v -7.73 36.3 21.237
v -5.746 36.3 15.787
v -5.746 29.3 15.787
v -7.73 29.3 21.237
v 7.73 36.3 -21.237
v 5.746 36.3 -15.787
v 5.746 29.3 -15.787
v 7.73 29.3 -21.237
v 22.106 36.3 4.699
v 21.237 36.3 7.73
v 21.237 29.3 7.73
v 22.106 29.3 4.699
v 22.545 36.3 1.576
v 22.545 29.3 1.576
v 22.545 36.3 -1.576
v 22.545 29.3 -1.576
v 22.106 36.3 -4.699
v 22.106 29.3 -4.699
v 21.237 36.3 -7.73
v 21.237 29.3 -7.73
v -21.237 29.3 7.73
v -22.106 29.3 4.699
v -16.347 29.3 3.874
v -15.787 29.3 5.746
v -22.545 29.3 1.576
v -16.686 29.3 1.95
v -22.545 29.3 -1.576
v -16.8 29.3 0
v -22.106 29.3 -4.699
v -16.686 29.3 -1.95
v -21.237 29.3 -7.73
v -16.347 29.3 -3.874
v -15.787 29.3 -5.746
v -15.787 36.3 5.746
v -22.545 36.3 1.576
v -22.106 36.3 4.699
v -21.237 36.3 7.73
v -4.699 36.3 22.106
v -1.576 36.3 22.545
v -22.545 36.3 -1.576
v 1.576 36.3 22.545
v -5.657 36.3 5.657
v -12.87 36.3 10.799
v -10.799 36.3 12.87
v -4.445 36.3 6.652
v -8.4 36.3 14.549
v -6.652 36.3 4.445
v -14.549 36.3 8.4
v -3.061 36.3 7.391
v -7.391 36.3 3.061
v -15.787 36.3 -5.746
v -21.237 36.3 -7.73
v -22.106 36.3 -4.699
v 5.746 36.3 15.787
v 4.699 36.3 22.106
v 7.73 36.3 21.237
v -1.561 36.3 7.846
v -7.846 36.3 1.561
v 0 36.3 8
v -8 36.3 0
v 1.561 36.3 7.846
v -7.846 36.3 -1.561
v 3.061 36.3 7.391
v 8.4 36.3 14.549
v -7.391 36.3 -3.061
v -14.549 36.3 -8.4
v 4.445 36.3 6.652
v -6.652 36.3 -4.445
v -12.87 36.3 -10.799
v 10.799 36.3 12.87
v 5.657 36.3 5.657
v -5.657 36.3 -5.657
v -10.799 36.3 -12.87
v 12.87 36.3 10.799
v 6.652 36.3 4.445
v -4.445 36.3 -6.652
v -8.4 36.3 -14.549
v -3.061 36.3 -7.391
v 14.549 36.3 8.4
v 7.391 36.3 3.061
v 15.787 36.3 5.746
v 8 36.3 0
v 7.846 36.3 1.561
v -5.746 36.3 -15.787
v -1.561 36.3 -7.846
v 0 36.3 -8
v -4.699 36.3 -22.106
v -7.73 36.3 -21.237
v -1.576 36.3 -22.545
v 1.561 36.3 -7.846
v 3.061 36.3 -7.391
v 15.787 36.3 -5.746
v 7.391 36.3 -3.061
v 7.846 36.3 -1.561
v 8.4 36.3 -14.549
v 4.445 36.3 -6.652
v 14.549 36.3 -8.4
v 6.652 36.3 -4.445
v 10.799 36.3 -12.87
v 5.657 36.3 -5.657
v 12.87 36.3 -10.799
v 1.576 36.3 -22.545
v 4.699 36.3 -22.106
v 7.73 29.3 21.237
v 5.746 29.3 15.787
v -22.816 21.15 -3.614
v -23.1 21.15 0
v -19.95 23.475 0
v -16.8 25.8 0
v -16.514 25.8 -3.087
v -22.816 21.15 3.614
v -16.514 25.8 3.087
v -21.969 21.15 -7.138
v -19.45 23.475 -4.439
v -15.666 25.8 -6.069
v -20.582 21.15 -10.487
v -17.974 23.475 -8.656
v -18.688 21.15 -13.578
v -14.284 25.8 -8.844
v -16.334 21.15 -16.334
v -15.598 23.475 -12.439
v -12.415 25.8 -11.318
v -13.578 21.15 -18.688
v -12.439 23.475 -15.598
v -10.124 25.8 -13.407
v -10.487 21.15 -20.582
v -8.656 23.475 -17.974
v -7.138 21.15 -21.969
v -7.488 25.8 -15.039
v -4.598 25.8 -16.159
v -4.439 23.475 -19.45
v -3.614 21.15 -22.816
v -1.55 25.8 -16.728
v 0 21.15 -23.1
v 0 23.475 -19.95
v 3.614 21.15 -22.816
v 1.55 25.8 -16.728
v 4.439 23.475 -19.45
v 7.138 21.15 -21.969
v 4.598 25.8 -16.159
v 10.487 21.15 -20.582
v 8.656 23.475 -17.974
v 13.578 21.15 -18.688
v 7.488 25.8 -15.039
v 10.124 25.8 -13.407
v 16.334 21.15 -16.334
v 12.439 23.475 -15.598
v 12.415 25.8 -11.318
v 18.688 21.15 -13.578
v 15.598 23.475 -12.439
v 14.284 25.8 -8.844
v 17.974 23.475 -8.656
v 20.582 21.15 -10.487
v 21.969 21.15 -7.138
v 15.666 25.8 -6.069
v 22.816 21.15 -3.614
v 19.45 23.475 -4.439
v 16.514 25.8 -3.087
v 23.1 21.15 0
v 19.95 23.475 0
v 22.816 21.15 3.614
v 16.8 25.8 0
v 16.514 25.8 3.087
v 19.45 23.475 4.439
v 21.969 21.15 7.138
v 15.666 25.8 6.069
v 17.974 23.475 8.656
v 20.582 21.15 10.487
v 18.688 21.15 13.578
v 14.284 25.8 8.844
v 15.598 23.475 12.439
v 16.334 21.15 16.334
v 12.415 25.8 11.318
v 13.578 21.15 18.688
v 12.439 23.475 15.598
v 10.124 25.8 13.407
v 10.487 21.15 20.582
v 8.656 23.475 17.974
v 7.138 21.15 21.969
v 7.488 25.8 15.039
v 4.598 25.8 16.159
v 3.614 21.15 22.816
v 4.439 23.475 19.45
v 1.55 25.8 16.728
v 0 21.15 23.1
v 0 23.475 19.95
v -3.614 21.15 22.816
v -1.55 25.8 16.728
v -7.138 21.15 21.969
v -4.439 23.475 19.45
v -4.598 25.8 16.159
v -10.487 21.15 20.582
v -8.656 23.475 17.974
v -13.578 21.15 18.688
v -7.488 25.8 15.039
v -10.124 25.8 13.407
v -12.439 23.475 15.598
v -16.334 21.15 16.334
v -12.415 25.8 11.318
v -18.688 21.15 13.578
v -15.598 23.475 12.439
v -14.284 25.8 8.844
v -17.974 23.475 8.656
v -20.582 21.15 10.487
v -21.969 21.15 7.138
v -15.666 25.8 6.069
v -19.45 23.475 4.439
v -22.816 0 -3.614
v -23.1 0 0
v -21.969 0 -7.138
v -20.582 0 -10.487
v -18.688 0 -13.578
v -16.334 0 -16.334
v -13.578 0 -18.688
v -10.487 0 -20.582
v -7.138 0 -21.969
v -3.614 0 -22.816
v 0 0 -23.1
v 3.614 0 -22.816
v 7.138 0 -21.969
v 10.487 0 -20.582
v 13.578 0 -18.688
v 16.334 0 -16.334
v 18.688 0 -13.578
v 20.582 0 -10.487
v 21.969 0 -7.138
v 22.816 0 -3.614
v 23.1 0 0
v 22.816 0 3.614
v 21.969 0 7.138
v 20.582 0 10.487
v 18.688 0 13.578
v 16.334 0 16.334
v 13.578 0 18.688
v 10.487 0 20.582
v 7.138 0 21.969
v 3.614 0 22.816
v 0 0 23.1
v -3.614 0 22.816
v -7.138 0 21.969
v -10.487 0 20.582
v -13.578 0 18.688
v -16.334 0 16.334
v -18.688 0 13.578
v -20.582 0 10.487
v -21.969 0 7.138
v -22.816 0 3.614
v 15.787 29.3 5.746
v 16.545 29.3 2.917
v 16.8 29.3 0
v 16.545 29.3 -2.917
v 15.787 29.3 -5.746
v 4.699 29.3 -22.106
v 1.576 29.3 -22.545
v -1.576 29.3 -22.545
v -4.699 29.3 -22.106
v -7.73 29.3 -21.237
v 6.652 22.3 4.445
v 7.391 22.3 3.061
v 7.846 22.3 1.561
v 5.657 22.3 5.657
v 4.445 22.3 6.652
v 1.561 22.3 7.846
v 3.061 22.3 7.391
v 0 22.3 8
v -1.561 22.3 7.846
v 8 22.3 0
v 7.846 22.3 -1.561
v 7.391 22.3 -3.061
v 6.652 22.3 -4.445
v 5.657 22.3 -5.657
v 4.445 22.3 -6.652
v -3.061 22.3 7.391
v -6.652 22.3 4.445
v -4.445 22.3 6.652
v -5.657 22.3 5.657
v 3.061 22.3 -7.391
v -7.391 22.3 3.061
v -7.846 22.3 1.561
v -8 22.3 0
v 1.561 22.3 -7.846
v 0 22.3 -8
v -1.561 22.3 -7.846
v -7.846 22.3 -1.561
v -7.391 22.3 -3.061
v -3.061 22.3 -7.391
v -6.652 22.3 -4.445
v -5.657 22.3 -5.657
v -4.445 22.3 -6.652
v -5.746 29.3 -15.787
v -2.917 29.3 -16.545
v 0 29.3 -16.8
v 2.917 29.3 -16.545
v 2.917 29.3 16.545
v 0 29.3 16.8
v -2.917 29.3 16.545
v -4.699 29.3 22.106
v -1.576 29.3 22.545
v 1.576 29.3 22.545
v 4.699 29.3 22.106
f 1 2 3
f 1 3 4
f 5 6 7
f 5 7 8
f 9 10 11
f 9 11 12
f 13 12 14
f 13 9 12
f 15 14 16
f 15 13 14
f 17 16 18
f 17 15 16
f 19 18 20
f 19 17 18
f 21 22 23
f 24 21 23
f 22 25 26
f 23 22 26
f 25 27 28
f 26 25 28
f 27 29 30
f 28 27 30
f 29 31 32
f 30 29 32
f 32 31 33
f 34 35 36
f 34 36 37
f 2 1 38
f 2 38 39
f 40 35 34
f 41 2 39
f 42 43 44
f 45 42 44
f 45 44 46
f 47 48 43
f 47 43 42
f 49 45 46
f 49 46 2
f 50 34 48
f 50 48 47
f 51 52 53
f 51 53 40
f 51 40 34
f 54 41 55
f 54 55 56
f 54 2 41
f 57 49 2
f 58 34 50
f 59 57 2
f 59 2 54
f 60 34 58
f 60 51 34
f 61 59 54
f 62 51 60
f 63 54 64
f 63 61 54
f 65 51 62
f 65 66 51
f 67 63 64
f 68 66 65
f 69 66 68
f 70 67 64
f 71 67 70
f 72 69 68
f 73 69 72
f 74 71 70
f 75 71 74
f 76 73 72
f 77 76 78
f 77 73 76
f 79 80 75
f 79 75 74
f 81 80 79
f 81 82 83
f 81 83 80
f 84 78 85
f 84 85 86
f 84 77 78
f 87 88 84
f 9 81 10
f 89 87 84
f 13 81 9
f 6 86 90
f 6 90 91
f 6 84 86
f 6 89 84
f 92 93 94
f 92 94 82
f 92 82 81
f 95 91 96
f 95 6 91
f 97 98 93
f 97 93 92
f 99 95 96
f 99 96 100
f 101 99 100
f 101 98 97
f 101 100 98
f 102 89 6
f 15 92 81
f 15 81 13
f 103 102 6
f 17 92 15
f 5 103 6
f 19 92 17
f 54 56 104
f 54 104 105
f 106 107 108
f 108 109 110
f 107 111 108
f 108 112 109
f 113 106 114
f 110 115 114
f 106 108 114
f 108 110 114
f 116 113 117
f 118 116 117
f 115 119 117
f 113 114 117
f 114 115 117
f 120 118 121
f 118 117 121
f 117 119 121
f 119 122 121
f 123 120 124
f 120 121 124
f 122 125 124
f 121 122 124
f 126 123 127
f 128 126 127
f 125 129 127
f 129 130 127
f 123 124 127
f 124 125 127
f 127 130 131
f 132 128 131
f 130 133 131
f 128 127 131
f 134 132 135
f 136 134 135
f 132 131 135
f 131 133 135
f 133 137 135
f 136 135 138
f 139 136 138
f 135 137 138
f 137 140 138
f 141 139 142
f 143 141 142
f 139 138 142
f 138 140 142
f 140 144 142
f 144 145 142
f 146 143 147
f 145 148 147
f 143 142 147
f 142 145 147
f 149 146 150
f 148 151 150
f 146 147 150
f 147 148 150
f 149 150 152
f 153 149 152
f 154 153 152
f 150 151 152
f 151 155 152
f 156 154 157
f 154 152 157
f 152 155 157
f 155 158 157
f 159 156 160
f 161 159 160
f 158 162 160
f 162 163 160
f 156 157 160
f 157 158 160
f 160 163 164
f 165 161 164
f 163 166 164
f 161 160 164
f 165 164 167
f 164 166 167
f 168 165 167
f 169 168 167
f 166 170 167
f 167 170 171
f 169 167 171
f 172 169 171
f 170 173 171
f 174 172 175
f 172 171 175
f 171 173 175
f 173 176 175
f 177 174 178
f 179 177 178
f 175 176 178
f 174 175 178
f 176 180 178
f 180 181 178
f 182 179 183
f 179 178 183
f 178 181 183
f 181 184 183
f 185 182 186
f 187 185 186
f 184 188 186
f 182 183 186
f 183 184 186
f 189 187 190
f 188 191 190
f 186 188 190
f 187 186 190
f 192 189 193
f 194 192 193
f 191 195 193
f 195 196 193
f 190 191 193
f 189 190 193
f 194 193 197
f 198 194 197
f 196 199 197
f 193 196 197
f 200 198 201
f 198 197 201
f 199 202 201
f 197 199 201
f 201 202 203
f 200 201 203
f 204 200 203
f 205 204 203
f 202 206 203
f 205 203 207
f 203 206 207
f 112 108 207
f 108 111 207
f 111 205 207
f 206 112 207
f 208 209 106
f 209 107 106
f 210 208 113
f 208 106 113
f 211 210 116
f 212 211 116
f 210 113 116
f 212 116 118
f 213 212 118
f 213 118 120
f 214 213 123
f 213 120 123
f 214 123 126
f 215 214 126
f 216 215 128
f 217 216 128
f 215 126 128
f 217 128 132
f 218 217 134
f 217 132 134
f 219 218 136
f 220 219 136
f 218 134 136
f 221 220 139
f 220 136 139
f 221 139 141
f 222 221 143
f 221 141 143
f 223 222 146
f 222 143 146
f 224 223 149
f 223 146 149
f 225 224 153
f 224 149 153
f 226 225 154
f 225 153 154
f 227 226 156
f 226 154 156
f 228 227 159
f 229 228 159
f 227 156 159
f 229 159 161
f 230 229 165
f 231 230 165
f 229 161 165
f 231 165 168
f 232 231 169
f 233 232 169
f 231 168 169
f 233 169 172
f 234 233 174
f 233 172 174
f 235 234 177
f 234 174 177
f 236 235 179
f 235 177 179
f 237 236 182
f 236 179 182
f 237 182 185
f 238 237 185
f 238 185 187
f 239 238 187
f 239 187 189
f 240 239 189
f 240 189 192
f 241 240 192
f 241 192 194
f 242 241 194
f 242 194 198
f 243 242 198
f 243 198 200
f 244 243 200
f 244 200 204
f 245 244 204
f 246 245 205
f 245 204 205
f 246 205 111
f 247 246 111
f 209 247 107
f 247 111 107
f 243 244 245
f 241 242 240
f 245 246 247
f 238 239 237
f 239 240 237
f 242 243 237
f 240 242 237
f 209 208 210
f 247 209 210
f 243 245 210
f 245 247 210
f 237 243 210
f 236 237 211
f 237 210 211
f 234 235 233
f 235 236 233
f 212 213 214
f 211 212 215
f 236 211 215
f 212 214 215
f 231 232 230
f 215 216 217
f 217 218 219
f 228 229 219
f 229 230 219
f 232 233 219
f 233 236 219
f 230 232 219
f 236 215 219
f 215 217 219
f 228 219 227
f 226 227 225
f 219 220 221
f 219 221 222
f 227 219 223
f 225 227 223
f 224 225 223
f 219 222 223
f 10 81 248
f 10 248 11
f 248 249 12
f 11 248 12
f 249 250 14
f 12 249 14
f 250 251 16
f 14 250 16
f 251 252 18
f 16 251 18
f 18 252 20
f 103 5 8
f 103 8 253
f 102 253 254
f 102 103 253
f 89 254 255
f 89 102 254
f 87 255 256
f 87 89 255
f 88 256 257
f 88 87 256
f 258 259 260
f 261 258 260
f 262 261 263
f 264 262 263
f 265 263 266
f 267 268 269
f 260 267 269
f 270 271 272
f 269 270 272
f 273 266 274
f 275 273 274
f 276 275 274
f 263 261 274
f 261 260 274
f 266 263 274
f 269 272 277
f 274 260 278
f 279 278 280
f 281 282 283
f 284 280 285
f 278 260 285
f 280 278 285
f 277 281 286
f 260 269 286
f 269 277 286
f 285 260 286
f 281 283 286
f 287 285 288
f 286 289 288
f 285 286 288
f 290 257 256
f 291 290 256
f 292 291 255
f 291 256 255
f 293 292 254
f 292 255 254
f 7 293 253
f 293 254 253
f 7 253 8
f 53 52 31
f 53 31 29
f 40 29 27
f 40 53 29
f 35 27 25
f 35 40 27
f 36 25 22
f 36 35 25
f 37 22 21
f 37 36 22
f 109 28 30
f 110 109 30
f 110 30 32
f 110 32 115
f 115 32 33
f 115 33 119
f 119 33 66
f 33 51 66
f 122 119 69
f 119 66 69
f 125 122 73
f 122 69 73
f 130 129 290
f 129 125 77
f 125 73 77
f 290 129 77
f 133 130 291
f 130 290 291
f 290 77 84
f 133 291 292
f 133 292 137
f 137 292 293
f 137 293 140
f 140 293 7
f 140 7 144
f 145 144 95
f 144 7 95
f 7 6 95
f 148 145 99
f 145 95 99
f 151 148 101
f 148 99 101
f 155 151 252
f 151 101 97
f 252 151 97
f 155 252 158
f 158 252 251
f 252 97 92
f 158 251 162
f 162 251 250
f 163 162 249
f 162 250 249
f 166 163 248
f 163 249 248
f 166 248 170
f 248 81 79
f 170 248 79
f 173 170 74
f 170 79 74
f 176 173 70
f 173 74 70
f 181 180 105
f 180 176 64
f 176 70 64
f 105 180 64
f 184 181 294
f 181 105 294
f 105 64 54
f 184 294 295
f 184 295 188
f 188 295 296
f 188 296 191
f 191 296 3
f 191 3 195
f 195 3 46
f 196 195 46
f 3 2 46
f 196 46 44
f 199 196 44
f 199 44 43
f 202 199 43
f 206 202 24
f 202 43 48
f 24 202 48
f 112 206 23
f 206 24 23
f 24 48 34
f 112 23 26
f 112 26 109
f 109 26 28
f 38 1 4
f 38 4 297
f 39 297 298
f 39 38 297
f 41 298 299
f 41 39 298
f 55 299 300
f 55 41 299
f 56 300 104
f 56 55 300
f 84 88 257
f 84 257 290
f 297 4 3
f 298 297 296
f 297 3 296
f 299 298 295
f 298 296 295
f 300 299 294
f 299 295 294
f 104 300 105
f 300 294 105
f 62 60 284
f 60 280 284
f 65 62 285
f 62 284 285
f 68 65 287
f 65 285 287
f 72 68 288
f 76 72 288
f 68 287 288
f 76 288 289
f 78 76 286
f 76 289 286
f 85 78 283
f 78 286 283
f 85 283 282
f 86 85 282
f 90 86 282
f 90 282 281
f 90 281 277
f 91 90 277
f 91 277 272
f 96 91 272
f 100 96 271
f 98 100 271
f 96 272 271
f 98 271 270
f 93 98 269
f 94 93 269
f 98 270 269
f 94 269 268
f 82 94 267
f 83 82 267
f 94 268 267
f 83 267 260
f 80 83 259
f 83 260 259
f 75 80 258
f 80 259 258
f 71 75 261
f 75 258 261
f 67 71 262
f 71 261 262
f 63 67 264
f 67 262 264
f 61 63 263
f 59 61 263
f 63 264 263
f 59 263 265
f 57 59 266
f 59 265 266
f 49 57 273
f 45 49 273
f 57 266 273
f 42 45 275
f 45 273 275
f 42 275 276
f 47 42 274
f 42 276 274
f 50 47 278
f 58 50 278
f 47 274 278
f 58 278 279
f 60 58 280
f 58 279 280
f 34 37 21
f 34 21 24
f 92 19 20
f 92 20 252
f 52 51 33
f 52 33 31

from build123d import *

# Parameters (mm, degrees)
DODANIE_WYCI_GNI_CIE1_DEPTH = 7


with BuildPart() as part:
    # Szkic1 → Obrót1 (revolve)
    with BuildSketch(Plane.XY):
        Polygon((0, 0), (-23.1, 0), (-23.1, 21.15), (-16.8, 25.8), (-16.8, 36.3), (-8, 36.3), (-8, 22.3), (0, 22.3), align=None)
    revolve(axis=Axis((0, 22.3, 0), (0, -1, 0)))

    # Szkic2 → Dodanie-wyciągnięcie1 (add)
    with BuildSketch(Plane(origin=(0, 36.3, 0), x_dir=(1, 0, 0), z_dir=(0, 1, 0))):
        with BuildLine():
            Line((-7.729655239, 21.23705323), (-5.745938408, 15.786836029))
            ThreePointArc((-5.745938408, 15.786836029), (0, 16.8), (5.745938408, 15.786836029))
            Line((5.745938408, 15.786836029), (7.729655239, 21.23705323))
            ThreePointArc((7.729655239, 21.23705323), (0, 22.6), (-7.729655239, 21.23705323))
        make_face()
        with BuildLine():
            ThreePointArc((15.786836029, 5.745938408), (16.8, 0), (15.786836029, -5.745938408))
            Line((15.786836029, -5.745938408), (21.23705323, -7.729655239))
            ThreePointArc((21.23705323, -7.729655239), (22.6, 0), (21.23705323, 7.729655239))
            Line((21.23705323, 7.729655239), (15.786836029, 5.745938408))
        make_face()
        with BuildLine():
            ThreePointArc((5.745938408, -15.786836029), (0, -16.8), (-5.745938408, -15.786836029))
            Line((-5.745938408, -15.786836029), (-7.729655239, -21.23705323))
            ThreePointArc((-7.729655239, -21.23705323), (0, -22.6), (7.729655239, -21.23705323))
            Line((7.729655239, -21.23705323), (5.745938408, -15.786836029))
        make_face()
        with BuildLine():
            ThreePointArc((-15.786836029, -5.745938408), (-16.8, 0), (-15.786836029, 5.745938408))
            Line((-15.786836029, 5.745938408), (-21.23705323, 7.729655239))
            ThreePointArc((-21.23705323, 7.729655239), (-22.6, 0), (-21.23705323, -7.729655239))
            Line((-21.23705323, -7.729655239), (-15.786836029, -5.745938408))
        make_face()
    extrude(amount=-DODANIE_WYCI_GNI_CIE1_DEPTH)


solid = part.part
